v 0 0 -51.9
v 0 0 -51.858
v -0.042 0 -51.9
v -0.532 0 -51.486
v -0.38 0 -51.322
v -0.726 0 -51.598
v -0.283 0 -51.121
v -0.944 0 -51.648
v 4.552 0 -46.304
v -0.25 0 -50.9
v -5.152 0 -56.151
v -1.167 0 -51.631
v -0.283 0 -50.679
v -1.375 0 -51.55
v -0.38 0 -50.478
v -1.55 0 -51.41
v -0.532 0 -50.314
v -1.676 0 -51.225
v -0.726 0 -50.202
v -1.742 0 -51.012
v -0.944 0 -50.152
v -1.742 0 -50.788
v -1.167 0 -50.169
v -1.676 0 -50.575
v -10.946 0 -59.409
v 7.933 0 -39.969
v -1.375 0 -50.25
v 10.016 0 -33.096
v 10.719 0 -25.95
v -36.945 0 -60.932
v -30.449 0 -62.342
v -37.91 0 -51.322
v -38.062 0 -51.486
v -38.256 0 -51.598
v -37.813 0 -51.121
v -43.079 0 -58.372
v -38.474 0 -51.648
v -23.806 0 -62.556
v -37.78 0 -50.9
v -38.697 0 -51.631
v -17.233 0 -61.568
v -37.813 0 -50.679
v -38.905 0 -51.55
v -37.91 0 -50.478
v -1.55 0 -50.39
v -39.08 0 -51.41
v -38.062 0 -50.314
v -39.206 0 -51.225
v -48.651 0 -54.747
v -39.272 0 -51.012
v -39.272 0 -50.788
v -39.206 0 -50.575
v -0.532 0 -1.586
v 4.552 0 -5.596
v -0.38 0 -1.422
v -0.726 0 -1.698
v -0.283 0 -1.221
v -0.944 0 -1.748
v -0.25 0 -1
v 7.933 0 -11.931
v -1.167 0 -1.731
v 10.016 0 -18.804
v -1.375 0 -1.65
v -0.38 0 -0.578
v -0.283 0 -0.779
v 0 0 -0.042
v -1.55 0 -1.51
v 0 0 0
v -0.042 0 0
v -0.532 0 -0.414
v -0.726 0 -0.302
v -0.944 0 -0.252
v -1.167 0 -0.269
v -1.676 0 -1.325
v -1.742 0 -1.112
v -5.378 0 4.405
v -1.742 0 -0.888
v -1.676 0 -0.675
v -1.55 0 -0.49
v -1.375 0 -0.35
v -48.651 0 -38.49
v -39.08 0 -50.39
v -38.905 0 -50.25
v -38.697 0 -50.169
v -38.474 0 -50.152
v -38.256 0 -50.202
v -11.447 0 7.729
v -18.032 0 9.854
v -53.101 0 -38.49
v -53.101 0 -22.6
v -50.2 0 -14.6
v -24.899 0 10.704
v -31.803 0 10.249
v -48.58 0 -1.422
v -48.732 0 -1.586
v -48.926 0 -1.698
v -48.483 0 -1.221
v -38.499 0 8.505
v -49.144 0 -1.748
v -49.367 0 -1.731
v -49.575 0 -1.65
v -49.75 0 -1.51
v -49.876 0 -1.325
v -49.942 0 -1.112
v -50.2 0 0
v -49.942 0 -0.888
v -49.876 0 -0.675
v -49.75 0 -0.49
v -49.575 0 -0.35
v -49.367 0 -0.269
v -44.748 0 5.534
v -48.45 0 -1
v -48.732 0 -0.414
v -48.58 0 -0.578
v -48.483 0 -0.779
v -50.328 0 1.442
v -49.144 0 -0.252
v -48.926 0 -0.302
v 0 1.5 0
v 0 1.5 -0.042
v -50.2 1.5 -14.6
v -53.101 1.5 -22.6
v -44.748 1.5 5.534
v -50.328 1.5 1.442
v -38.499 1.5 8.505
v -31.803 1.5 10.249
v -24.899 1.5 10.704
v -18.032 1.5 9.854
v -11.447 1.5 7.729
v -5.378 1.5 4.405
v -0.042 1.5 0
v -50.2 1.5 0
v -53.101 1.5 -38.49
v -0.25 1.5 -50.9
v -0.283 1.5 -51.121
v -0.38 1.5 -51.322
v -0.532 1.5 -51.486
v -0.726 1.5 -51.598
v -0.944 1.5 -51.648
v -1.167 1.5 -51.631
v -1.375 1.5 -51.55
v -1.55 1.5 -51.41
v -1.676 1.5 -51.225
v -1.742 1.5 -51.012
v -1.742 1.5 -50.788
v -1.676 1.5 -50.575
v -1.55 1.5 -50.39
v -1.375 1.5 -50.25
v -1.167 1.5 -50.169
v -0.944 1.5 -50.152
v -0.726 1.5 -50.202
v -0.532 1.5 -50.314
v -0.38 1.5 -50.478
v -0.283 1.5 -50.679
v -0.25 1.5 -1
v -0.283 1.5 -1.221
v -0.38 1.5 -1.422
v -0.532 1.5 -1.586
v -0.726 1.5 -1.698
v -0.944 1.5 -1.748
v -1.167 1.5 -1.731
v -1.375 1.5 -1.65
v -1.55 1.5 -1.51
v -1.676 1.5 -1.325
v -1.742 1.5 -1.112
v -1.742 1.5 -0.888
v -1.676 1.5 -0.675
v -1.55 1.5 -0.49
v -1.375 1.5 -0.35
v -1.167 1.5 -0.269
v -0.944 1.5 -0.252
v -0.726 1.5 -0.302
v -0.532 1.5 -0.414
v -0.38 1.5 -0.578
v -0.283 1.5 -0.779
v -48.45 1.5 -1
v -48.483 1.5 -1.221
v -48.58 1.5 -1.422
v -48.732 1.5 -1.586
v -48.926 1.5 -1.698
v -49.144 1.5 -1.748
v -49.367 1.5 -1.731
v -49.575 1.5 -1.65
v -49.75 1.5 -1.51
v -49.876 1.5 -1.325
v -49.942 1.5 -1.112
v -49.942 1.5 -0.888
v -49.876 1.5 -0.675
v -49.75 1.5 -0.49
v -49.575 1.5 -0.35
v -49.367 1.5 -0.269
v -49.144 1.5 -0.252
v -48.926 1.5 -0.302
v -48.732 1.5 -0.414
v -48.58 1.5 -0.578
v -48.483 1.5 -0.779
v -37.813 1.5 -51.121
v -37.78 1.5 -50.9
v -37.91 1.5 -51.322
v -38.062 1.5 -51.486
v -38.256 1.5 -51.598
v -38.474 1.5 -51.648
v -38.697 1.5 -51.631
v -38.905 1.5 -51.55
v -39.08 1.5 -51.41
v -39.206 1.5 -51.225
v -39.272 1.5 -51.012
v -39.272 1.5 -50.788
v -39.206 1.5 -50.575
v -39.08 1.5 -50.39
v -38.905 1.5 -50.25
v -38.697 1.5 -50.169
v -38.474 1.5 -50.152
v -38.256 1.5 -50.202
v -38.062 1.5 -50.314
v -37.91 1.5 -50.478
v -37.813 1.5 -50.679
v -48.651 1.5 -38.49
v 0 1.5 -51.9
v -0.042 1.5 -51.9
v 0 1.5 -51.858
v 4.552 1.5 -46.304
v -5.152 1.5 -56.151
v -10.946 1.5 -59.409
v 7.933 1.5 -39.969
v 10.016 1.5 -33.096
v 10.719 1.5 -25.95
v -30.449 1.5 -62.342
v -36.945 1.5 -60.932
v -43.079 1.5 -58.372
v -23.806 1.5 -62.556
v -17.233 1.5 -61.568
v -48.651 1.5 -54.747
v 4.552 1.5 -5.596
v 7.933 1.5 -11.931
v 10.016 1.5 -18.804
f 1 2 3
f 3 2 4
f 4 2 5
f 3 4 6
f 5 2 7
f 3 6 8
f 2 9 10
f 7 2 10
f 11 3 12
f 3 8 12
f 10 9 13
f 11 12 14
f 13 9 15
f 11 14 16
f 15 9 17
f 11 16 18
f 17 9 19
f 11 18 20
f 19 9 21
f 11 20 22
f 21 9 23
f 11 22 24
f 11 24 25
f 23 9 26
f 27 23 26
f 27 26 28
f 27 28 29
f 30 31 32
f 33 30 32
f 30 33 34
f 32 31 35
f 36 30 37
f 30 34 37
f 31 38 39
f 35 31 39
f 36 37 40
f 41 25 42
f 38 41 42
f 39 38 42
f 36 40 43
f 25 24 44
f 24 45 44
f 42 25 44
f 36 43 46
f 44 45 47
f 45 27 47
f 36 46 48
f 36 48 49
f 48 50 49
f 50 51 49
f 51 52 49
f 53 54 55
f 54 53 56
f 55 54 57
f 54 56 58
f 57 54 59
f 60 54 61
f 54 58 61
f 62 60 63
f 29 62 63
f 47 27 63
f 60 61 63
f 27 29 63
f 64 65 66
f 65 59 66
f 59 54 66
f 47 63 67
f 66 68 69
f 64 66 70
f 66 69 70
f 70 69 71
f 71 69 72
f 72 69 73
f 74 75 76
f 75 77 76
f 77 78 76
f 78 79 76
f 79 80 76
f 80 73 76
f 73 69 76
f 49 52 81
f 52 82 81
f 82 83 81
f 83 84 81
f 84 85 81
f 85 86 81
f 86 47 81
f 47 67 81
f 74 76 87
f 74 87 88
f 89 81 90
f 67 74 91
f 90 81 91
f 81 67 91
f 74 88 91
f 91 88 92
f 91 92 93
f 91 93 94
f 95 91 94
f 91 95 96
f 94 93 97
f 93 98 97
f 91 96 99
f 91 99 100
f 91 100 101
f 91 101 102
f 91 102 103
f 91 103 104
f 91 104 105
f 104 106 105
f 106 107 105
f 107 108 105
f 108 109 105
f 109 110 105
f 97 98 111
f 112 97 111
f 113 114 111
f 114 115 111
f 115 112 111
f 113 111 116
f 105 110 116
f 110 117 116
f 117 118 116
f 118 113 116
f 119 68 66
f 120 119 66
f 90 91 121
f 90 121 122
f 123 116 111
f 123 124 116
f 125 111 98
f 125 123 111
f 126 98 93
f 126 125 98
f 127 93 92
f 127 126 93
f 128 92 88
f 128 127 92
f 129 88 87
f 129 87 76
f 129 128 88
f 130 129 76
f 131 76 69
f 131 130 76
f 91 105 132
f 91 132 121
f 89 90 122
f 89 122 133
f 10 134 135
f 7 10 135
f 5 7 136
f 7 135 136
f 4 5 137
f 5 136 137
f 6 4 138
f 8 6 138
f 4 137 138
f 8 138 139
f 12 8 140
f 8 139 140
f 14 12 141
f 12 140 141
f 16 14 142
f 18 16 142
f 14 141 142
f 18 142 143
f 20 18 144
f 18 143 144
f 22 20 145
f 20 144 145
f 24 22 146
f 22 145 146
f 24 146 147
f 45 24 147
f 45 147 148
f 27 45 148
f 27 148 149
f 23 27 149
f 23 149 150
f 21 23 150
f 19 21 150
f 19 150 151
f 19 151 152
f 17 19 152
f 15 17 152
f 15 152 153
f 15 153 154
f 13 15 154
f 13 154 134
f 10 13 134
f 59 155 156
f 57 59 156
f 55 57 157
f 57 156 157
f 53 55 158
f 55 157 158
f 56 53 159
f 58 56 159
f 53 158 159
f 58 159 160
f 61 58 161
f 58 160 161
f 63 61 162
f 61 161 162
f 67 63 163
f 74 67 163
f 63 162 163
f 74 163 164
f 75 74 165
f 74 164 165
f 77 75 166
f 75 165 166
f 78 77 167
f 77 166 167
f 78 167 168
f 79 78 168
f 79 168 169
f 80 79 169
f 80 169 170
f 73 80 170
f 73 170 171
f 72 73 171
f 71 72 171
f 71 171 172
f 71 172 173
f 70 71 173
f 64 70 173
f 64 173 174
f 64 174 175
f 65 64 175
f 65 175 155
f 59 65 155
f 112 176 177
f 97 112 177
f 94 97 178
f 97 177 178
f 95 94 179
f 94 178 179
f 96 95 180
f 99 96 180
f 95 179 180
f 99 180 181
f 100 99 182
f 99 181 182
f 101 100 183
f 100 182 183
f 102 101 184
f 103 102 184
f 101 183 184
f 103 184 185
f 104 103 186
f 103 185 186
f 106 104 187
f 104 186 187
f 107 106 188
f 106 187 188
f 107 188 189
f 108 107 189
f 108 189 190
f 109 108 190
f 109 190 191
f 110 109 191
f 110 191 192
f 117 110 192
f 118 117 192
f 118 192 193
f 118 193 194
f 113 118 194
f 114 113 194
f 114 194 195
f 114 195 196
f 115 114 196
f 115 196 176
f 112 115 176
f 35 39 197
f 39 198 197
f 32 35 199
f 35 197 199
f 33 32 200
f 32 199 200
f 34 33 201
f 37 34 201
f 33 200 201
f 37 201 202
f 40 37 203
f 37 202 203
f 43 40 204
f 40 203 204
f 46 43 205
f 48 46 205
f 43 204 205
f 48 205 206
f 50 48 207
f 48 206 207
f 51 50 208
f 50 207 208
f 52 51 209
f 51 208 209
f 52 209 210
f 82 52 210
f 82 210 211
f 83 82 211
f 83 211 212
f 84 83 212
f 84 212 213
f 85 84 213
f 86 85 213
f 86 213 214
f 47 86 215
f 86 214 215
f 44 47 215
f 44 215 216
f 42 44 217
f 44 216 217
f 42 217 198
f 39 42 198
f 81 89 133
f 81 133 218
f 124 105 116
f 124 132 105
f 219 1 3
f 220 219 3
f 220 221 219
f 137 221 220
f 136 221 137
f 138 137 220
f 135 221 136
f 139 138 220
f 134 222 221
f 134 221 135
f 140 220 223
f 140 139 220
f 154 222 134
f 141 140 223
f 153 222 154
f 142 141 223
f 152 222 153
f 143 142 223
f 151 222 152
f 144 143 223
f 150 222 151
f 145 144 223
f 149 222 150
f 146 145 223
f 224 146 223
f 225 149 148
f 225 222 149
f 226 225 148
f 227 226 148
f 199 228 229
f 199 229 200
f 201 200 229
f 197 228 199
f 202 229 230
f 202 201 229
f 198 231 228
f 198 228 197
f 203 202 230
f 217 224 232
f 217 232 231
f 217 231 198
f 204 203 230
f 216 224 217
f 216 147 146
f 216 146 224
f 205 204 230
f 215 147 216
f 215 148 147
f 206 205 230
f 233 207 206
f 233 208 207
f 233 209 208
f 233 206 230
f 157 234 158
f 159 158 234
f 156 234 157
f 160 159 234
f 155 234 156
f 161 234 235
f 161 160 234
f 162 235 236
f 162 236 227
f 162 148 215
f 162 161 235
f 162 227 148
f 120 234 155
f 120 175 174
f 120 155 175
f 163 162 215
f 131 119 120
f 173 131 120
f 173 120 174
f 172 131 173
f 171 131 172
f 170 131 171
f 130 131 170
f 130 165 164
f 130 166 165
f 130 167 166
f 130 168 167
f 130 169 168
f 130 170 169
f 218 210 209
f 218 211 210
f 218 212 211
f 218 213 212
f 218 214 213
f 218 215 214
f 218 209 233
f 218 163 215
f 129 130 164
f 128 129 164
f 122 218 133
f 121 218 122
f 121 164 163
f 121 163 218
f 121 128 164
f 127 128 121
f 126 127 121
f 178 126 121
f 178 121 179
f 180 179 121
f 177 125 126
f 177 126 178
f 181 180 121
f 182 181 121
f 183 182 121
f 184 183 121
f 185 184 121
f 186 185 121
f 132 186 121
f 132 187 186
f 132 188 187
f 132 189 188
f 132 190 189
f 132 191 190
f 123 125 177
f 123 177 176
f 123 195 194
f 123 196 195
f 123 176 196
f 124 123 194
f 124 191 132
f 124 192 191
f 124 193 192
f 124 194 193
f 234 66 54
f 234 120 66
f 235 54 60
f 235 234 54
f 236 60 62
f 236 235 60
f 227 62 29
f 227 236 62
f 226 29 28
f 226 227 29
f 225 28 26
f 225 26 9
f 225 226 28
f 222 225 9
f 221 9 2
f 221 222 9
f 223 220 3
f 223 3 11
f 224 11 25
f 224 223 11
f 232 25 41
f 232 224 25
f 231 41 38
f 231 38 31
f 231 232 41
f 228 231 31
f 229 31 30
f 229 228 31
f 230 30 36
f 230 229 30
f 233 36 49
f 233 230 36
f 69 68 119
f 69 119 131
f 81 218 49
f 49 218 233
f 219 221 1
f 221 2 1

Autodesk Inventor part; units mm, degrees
ref_plane "YZ Plane" through (0, 0, 0) normal (1, 0, 0) x (0, 1, 0)
ref_plane "XZ Plane" through (0, 0, 0) normal (0, 1, 0) x (-1, 0, 0)
ref_plane "XY Plane" through (0, 0, 0) normal (0, 0, 1) x (1, 0, 0)
sketch "Sketch1" plane through (0, 0, 0) normal (0, 1, 0) x (-1, 0, 0)
  line L0 (0, 0) -> (0, -51.9)
  line L1 (0, -51.9) -> (39.53, -51.9)
  line L2 (0, 0) -> (53.1, 0)
  line L3 (0, 0) -> (50.2, 0)
  line L4 (50.2, 0) -> (50.2, -14.6)
  line L5 (50.2, 0) -> (64.8, 0) construction
  line L6 (50.2, -14.6) -> (53.1008, -22.6003)
  line L7 (50.2, -14.6) -> (58.71, -14.6) construction
  line L8 (53.1008, -22.6003) -> (53.1008, -38.4903)
  line L9 (53.1008, -38.4903) -> (48.6508, -38.4903)
  line L10 (48.6508, -38.4903) -> (39.53, -51.9)
  dimension "d0" = 51.9
  dimension "d1" = 39.53
  dimension "d9" = 50.2
  dimension "d10" = 14.6
  dimension "d11" = 90
  dimension "d12" = 8.51
  dimension "d13" = 70.07
  dimension "d14" = 15.89
  dimension "d17" = 4.45
extrude "Extrusion1" add sketch "Sketch1" along normal blind 1.5
sketch "Sketch2" plane through (0, 1.5, 0) normal (0, 1, 0) x (1, 0, 0)
  circle A0 centre (-1, 1) radius 0.75
  point P0 (0, 0)
  dimension "d22" = 1.5
extrude "Extrusion2" cut sketch "Sketch2" against normal blind 10
sketch "Sketch3" plane through (0, 1.5, 0) normal (0, 1, 0) x (1, 0, 0)
  line L0 (0, 0) -> (0, 51.9) projected
  line L1 (0, 51.9) -> (-39.53, 51.9) projected
  circle A0 centre (-1, 50.9) radius 0.75
  dimension "d27" = 1.5
extrude "Extrusion3" cut sketch "Sketch3" against normal blind 10
sketch "Sketch4" plane through (0, 1.5, 0) normal (0, 1, 0) x (1, 0, 0)
  circle A0 centre (-49.2, 1) radius 0.75
  line L0 (-39.53, 51.9) -> (-48.6508, 38.4903) projected
  circle A1 centre (-38.53, 50.9) radius 0.75
  point P0 (0, 0)
  point P1 (-50.2, 0)
  dimension "d32" = 1.5
  dimension "d35" = 1.5
extrude "Extrusion4" cut sketch "Sketch4" against normal blind 10
sketch "Sketch5" plane through (0, 1.5, 0) normal (0, 1, 0) x (1, 0, 0)
  line L0 (0, 0) -> (0, 51.9) projected
  line L1 (0, 25.95) -> (-25.95, 25.95)
  arc A0 (-50.3282, -1.4419) -> (-48.6508, 54.7474) centre (-25.95, 25.95) ccw
  line L2 (-39.53, 51.9) -> (-48.6508, 38.4903) projected
  line L3 (-48.6508, 38.4903) -> (-48.6508, 54.7474)
  line L4 (-39.53, 51.9) -> (0, 51.9)
  line L5 (0, 0) -> (0, 51.9)
  line L6 (-50.2, 0) -> (0, 0) projected
  line L7 (0, 0) -> (-50.2, 0)
  line L8 (-50.2, 0) -> (-50.3282, -1.4419)
  point P0 (-0.0422, 51.9)
  point P1 (0, 0.0422)
  point P2 (0, 51.8578)
  point P3 (-0.0422, 0)
  dimension "d38" = 25.95
  dimension "d39" = 36.669
extrude "Extrusion5" add sketch "Sketch5" against normal blind 1.5 contours A0 L8 L6 | L4 L2 L3 A0 | L0 A0
properties part number "CaseCover"
